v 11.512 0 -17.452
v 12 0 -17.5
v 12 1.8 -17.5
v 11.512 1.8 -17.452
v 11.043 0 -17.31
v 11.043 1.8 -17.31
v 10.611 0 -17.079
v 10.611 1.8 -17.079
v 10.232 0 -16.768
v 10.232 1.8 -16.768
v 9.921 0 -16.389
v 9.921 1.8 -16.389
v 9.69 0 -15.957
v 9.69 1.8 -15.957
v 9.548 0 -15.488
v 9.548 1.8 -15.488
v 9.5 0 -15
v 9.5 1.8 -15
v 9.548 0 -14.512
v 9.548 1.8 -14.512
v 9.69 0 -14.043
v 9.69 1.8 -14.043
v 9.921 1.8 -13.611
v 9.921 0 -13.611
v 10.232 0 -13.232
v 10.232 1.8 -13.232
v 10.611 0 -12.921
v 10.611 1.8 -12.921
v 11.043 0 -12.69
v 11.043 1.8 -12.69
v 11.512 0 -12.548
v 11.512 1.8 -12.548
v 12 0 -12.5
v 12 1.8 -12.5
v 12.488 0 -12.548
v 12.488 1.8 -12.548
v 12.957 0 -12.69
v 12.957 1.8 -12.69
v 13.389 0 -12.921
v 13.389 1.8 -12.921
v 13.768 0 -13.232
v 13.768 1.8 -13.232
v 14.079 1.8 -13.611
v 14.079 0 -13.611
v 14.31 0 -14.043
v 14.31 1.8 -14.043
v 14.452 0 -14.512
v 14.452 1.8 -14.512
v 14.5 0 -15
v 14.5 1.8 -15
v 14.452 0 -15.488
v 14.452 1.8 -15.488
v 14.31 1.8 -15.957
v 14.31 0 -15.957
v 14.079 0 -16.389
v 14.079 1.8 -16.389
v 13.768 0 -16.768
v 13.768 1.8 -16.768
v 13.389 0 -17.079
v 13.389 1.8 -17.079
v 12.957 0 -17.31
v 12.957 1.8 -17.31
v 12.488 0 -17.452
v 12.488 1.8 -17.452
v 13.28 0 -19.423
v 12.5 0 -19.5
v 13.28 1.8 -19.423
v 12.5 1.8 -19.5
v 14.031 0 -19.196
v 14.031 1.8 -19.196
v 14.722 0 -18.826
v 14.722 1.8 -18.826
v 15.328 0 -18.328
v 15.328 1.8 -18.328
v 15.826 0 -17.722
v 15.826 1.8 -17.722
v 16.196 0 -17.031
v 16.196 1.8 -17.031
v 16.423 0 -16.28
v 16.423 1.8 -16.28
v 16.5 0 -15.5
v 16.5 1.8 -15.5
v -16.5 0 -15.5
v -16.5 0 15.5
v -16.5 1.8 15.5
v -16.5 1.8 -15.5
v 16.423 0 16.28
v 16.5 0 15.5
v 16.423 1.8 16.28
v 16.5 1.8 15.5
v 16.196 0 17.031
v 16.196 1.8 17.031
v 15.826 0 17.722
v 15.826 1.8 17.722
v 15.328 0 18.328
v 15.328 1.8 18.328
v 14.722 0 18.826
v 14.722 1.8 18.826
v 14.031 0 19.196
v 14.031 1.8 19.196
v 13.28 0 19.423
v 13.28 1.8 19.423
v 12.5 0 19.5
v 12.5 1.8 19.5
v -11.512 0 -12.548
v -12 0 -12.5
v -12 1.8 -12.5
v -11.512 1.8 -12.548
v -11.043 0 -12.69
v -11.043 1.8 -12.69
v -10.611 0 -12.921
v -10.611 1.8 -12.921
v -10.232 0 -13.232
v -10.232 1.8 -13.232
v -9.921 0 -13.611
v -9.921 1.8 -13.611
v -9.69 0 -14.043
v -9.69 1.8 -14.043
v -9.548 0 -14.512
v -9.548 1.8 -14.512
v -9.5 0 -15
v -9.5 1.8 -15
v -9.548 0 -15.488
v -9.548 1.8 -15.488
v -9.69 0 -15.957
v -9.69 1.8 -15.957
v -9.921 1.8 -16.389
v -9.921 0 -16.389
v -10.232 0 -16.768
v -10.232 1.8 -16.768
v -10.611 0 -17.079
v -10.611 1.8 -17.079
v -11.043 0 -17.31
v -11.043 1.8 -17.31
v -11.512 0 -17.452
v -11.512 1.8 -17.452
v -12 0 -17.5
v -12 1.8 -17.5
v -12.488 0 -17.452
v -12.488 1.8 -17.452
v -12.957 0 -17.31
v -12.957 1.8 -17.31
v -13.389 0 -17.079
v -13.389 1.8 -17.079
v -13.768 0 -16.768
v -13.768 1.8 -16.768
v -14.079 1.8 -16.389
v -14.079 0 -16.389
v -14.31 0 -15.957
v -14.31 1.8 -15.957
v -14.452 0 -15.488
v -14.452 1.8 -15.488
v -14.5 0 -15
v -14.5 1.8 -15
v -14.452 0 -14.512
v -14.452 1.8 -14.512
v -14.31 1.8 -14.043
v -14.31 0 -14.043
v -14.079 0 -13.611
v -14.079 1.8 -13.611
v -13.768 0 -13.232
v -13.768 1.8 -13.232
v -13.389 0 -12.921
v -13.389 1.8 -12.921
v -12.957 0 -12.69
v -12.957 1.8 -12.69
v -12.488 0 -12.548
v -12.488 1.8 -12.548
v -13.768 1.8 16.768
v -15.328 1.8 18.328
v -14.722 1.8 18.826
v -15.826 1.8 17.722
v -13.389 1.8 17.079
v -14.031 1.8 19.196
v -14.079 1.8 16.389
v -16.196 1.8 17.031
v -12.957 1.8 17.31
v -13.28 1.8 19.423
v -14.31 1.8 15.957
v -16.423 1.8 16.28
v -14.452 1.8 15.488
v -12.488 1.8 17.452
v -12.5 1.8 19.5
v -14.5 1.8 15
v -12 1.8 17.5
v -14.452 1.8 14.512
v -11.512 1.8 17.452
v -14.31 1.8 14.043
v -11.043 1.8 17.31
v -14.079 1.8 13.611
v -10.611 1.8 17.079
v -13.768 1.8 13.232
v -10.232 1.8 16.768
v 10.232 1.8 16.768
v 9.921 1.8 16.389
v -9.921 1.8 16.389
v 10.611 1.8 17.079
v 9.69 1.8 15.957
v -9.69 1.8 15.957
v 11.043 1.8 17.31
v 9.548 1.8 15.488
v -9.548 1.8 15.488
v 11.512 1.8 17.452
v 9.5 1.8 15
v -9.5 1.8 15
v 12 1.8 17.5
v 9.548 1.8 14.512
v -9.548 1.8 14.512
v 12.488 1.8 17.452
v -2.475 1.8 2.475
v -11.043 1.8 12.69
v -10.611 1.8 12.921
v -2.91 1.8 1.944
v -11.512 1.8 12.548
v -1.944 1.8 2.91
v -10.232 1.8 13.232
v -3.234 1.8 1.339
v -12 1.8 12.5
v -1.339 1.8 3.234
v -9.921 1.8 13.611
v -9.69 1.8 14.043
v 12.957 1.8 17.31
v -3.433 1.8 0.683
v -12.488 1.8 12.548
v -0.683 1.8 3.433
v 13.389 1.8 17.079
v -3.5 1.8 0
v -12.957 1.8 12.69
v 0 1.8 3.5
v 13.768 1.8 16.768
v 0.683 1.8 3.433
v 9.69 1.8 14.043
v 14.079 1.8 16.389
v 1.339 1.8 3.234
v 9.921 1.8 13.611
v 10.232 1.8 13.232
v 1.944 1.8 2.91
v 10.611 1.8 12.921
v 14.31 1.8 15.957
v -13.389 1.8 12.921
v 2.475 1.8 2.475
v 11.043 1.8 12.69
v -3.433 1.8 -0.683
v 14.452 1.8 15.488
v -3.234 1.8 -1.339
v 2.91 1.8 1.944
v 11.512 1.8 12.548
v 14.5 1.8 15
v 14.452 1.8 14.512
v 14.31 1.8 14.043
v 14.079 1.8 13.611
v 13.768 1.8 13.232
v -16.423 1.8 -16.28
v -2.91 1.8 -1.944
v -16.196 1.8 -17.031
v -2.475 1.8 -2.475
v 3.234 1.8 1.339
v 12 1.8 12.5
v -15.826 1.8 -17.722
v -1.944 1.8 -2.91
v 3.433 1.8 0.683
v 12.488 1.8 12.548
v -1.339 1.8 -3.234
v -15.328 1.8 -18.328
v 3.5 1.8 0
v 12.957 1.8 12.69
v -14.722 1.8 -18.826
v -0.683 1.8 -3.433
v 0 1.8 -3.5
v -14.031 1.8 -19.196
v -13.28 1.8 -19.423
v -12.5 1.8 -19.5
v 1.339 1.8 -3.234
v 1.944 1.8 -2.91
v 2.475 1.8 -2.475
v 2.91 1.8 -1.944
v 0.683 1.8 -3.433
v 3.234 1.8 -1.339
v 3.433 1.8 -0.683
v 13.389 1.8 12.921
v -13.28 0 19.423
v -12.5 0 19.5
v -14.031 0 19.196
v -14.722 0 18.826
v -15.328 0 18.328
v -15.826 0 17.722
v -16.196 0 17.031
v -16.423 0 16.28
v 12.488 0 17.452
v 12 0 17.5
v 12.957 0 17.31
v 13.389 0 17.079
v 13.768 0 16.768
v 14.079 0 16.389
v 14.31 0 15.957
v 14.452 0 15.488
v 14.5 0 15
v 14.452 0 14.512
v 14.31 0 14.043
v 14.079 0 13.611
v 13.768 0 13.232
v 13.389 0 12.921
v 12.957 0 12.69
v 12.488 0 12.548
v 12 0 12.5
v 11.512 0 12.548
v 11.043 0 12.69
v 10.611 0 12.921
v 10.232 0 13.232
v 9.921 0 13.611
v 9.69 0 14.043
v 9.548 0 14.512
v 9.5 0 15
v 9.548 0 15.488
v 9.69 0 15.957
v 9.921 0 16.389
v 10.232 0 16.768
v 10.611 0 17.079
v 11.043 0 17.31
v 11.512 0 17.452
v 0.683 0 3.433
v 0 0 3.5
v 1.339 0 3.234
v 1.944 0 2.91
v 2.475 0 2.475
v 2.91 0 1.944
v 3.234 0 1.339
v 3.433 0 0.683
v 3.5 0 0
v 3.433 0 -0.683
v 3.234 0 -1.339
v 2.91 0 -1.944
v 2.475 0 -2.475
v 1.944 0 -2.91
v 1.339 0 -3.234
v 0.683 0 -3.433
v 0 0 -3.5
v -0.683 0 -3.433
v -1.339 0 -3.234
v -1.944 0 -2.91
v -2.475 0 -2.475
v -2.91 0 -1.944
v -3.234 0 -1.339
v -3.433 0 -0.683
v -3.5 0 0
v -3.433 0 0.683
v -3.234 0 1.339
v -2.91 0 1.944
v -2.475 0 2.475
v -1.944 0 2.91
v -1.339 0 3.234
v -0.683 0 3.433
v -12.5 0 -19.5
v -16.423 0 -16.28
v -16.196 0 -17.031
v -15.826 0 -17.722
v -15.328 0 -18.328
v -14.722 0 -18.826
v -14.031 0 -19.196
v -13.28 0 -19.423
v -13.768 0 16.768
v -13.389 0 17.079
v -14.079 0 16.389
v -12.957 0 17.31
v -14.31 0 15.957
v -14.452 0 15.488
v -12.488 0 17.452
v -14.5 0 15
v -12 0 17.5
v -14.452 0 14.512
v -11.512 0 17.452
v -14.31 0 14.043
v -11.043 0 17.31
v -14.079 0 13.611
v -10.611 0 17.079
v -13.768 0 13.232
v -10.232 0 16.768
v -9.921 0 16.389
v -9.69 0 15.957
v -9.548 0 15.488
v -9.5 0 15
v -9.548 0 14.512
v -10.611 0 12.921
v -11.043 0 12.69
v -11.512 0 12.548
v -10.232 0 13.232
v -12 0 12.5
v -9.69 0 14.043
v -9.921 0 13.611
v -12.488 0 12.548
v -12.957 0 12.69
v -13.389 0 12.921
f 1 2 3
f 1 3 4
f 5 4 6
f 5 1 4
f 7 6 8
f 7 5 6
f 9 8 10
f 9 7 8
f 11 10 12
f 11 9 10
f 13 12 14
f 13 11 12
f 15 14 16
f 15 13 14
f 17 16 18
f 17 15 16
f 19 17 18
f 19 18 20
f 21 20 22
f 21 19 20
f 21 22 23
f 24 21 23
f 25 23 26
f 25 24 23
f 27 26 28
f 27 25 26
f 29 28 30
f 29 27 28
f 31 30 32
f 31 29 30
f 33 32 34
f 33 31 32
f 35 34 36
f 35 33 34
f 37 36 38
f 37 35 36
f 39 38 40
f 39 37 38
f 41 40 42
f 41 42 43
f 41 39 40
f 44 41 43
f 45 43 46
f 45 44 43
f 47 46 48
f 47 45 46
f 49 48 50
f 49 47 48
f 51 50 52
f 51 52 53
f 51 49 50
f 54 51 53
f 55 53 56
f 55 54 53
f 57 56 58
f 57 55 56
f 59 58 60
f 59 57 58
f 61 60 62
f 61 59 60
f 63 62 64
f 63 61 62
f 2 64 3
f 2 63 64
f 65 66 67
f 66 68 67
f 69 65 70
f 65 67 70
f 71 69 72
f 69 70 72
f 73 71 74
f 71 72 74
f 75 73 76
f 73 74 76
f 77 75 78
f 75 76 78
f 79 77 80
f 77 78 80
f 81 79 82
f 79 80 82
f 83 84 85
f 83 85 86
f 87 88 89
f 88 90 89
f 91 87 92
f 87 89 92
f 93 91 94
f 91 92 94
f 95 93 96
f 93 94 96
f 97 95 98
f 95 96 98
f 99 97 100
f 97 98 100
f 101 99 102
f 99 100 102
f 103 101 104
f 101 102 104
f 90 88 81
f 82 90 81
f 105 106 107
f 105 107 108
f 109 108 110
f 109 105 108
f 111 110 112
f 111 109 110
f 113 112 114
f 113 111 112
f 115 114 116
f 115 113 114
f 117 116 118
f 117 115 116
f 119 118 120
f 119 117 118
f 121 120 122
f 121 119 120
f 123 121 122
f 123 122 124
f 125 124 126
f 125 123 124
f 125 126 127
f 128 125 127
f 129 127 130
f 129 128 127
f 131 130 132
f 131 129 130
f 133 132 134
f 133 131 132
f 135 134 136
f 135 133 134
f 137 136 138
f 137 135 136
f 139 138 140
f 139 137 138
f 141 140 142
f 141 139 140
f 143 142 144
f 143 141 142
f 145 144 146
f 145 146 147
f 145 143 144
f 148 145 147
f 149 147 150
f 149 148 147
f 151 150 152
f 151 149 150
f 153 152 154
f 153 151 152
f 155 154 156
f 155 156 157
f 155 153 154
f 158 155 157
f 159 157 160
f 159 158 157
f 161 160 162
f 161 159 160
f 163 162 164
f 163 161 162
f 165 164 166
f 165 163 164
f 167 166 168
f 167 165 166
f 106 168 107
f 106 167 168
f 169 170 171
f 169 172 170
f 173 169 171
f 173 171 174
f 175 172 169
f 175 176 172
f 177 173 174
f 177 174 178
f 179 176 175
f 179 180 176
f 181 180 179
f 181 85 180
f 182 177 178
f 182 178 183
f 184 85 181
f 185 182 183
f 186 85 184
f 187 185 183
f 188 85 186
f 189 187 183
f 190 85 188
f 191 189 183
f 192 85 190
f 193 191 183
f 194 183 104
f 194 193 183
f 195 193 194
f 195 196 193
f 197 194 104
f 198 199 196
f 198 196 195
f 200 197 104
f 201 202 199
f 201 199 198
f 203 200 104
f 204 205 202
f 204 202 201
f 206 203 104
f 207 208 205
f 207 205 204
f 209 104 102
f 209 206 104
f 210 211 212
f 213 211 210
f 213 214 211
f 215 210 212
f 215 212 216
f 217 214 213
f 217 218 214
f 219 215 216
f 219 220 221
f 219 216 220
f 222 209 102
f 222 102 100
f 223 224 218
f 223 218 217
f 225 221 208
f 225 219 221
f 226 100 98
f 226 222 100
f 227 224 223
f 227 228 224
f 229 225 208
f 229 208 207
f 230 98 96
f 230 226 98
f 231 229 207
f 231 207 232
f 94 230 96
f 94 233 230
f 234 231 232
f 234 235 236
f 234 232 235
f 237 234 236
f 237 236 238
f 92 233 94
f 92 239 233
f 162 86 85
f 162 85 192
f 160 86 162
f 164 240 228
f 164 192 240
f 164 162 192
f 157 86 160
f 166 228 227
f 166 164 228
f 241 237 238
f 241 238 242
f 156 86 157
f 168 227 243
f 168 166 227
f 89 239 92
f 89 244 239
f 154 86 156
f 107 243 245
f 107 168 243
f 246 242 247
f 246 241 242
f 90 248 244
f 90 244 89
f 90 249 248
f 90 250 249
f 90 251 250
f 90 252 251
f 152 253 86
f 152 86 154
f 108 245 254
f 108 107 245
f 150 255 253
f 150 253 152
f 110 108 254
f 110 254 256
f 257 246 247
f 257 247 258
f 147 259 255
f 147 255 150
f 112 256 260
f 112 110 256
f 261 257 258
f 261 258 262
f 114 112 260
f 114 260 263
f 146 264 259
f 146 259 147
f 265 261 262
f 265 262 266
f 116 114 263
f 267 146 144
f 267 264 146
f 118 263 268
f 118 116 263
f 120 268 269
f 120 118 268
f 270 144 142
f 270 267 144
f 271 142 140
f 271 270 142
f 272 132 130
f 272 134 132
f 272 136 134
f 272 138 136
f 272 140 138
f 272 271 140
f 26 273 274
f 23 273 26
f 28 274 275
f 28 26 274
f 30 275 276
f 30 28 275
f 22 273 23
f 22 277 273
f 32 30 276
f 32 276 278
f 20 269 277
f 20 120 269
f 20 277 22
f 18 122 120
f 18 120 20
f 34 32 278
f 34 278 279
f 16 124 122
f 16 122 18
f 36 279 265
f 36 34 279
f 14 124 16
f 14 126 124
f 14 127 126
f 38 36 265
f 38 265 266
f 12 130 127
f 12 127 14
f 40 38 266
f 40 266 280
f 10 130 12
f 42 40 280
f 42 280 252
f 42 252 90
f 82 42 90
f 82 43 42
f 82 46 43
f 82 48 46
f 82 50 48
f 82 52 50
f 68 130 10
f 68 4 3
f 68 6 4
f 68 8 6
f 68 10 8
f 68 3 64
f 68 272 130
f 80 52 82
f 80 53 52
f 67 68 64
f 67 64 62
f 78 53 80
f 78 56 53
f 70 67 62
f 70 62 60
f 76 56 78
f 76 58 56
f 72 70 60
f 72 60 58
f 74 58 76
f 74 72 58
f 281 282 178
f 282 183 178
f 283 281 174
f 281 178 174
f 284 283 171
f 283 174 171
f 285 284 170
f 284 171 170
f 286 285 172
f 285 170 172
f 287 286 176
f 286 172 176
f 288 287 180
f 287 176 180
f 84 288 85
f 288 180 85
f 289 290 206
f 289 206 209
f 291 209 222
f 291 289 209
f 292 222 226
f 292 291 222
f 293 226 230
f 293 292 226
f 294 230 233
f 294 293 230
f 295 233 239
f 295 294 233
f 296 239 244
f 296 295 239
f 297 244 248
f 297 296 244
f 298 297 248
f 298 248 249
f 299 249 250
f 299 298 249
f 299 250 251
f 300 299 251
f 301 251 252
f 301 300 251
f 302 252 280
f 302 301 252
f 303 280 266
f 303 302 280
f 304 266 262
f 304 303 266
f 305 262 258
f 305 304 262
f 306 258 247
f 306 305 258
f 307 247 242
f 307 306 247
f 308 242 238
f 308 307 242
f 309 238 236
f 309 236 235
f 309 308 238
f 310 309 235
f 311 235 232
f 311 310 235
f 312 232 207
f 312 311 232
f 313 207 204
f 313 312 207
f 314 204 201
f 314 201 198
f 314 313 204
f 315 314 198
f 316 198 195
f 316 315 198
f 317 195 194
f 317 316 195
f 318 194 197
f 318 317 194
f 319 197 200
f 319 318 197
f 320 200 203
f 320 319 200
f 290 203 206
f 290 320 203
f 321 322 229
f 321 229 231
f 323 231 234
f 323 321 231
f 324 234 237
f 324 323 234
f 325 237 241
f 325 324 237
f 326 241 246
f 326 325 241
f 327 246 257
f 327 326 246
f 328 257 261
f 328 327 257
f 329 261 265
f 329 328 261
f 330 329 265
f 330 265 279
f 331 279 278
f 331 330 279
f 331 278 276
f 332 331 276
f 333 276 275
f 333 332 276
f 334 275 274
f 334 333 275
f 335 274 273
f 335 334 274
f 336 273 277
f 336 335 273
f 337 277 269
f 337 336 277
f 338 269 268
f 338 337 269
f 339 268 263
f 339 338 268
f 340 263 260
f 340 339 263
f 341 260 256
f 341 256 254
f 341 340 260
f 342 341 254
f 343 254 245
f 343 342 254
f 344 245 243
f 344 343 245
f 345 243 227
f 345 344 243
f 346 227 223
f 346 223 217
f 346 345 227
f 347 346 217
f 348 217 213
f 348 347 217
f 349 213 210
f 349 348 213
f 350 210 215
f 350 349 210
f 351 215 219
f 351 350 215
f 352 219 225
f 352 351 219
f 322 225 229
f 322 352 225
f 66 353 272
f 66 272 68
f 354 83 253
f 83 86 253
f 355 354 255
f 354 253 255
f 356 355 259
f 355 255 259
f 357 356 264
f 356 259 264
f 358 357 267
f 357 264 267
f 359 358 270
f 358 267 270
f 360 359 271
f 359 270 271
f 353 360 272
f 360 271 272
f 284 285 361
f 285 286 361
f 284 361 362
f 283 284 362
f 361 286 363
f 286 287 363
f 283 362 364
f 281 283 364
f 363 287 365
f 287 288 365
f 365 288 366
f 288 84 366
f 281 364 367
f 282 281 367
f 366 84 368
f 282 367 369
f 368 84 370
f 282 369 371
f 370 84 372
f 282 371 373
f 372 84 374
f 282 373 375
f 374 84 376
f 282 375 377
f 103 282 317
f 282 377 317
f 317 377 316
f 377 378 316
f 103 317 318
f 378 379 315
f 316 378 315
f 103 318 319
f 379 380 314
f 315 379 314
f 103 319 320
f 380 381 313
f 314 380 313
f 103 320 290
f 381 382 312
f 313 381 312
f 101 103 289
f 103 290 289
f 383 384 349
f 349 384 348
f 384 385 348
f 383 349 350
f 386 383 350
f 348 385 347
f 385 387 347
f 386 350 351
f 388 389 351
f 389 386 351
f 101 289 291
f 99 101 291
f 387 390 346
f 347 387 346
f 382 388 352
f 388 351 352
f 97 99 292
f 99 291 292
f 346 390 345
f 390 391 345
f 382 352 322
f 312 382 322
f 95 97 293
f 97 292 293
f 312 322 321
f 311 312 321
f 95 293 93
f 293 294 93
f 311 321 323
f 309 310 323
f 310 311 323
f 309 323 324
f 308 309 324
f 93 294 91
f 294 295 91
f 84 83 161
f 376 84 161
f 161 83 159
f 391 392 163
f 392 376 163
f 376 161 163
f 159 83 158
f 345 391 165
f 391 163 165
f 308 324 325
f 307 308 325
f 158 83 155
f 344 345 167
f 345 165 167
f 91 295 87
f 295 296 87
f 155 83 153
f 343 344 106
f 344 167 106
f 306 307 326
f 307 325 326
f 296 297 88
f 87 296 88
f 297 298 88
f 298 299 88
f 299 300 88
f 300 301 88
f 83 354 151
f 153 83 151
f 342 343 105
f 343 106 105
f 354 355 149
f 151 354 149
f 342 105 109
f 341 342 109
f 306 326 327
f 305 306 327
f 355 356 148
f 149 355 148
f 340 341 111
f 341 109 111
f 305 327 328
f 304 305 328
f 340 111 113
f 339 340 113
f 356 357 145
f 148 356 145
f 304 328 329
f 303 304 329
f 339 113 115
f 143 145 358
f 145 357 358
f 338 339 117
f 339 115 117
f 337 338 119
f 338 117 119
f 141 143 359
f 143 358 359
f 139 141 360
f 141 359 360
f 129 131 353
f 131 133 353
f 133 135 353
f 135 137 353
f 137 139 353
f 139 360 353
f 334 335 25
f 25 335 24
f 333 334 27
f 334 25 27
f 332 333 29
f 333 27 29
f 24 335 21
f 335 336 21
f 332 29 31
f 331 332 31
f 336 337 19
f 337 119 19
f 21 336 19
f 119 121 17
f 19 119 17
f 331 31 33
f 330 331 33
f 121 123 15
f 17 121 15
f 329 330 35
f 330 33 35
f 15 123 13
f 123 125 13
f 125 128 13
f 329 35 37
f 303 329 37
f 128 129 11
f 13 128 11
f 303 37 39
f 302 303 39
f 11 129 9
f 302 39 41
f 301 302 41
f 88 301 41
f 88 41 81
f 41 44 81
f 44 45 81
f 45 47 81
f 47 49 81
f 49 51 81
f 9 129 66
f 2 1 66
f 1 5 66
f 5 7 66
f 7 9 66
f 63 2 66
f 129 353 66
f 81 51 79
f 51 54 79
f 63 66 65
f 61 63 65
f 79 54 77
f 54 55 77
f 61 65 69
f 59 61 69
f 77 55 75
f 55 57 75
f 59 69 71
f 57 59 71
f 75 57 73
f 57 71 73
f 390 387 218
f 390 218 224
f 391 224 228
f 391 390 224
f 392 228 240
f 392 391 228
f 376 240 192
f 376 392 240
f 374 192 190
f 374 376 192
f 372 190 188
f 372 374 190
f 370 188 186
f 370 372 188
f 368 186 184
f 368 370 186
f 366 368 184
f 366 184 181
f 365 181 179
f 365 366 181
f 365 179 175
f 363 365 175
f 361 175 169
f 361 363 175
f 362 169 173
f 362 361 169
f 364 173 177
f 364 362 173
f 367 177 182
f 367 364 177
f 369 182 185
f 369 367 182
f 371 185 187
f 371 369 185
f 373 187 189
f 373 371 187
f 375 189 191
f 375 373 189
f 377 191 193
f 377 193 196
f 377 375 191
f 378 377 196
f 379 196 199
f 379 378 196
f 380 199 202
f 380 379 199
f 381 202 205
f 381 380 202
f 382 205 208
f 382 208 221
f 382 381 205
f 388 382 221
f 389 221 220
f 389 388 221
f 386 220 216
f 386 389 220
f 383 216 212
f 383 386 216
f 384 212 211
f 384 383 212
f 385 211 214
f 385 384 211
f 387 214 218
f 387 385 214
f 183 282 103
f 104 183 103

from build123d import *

# Parameters (mm, degrees)
SKETCH1_W           = 33
SKETCH1_H           = 39
SKETCH1_R           = 2.5
SKETCH1_R_2         = 3.5
BOSS_EXTRUDE1_DEPTH = 1.8
FILLET1_R           = 4
FILLET2_R           = 4
FILLET3_R           = 4
FILLET4_R           = 4


with BuildPart() as part:
    # Sketch1 → Boss-Extrude1 (new body)
    with BuildSketch(Plane(origin=(0, 0, 0), x_dir=(1, 0, 0), z_dir=(0, 1, 0))):
        Rectangle(SKETCH1_W, SKETCH1_H)
        with Locations(Location((12, -15, 0), (0, 0, 270))):
            Circle(SKETCH1_R, mode=Mode.SUBTRACT)
        with Locations(Location((12, 15, 0), (0, 0, 90))):
            Circle(SKETCH1_R, mode=Mode.SUBTRACT)
        with Locations(Location((-12, -15, 0), (0, 0, 90))):
            Circle(SKETCH1_R, mode=Mode.SUBTRACT)
        with Locations(Location((-12, 15, 0), (0, 0, 270))):
            Circle(SKETCH1_R, mode=Mode.SUBTRACT)
        with Locations(Location((0, 0, 0), (0, 0, 270))):
            Circle(SKETCH1_R_2, mode=Mode.SUBTRACT)
    extrude(amount=BOSS_EXTRUDE1_DEPTH)

    # Fillet1
    fillet1_edges = [part.edges().sort_by_distance(p)[0] for p in [
        (-16.5, 0.9, -19.5),
    ]]
    fillet(fillet1_edges, radius=FILLET1_R)

    # Fillet2
    fillet2_edges = [part.edges().sort_by_distance(p)[0] for p in [
        (16.5, 0.9, -19.5),
    ]]
    fillet(fillet2_edges, radius=FILLET2_R)

    # Fillet3
    fillet3_edges = [part.edges().sort_by_distance(p)[0] for p in [
        (16.5, 0.9, 19.5),
    ]]
    fillet(fillet3_edges, radius=FILLET3_R)

    # Fillet4
    fillet4_edges = [part.edges().sort_by_distance(p)[0] for p in [
        (-16.5, 0.9, 19.5),
    ]]
    fillet(fillet4_edges, radius=FILLET4_R)


solid = part.part
